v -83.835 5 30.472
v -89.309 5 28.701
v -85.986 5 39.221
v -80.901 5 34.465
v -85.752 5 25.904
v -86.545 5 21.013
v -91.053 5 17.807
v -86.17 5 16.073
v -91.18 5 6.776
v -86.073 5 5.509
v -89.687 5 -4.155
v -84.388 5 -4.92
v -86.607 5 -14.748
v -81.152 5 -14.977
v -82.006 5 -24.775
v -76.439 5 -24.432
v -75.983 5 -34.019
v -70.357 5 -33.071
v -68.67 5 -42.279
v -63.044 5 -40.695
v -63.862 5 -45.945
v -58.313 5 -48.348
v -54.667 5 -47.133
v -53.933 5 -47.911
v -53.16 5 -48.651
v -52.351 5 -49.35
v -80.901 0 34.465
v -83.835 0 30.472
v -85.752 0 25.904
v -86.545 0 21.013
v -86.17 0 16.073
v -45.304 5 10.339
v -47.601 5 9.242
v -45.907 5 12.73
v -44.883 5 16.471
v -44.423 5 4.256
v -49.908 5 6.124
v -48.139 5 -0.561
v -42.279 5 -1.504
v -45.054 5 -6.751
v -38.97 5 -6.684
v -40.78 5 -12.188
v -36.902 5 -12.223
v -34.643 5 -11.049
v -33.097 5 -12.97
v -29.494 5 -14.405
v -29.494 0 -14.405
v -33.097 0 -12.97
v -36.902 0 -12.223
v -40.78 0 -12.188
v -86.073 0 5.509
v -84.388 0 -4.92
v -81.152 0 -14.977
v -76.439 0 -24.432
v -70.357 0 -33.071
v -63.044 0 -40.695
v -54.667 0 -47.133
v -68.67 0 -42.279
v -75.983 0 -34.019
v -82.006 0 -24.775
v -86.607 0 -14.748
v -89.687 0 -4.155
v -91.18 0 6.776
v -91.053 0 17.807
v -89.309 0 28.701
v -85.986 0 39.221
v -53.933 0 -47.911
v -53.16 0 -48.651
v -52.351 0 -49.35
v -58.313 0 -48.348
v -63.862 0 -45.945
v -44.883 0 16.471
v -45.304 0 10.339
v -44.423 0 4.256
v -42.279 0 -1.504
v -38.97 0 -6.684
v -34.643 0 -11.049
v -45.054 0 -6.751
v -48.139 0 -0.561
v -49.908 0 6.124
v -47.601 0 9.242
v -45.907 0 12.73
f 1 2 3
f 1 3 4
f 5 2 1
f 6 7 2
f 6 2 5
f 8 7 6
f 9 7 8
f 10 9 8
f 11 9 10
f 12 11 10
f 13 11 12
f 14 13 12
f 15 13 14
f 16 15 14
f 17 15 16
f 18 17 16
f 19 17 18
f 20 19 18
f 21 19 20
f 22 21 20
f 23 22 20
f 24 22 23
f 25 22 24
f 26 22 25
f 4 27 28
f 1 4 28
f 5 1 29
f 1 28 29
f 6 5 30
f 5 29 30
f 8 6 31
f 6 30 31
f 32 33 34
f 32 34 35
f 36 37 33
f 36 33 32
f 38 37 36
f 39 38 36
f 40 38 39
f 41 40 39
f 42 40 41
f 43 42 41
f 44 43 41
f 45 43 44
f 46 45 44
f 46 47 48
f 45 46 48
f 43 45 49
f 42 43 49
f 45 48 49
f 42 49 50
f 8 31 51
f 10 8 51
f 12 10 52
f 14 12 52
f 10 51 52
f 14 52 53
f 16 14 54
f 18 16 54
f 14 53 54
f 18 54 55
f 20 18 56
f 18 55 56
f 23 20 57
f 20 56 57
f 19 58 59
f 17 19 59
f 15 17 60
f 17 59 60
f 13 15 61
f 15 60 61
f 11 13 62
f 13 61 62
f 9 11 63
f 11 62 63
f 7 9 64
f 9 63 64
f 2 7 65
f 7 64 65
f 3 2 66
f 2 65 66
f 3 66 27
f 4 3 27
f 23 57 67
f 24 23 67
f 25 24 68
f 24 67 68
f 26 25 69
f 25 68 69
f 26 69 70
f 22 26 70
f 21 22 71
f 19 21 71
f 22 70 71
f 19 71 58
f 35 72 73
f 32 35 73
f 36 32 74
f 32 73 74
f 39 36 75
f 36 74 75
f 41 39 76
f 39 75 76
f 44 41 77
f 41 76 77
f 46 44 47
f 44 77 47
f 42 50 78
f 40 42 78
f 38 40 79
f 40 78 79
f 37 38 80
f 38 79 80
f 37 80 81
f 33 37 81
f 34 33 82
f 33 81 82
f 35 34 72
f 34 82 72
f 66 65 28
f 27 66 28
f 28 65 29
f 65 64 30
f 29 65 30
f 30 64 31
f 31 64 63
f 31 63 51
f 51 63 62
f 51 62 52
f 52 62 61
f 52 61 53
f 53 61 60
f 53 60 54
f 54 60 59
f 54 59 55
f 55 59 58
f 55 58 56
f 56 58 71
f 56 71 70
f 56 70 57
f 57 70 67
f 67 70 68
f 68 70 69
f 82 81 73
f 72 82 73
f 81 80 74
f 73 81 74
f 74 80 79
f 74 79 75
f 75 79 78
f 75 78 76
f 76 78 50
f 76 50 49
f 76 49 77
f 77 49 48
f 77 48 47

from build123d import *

# Parameters (mm, degrees)
BOSS_EXTRU_1_DEPTH   = 5
BOSS_EXTRU_1_2_DEPTH = 5


with BuildPart() as part:
    # Esquisse1 → Boss.-Extru.1 (new body)
    with BuildSketch(Plane(origin=(0, 0, 0), x_dir=(1, 0, 0), z_dir=(0, 1, 0))):
        with BuildLine():
            ThreePointArc((-68.670306383, 42.279177512), (-89.686909751, 4.154853404), (-85.986425434, -39.22103992))
            Line((-85.986425434, -39.22103992), (-80.900990435, -34.464540644))
            ThreePointArc((-80.900990435, -34.464540644), (-85.751719928, -25.903787737), (-86.17049139, -16.073187685))
            ThreePointArc((-86.17049139, -16.073187685), (-78.973775537, 19.793847734), (-54.666943907, 47.13273734))
            ThreePointArc((-54.666943907, 47.13273734), (-53.551106318, 48.285581279), (-52.350511604, 49.349872124))
            ThreePointArc((-52.350511604, 49.349872124), (-61.160452612, 47.314883556), (-68.670306383, 42.279177512))
        make_face()
    extrude(amount=BOSS_EXTRU_1_DEPTH)


with BuildPart() as body_2:
    # Esquisse1 → Boss.-Extru.1 2 (new body)
    with BuildSketch(Plane(origin=(0, 0, 0), x_dir=(1, 0, 0), z_dir=(0, 1, 0))):
        with BuildLine():
            ThreePointArc((-40.780479115, 12.187773174), (-46.754151205, 3.734713014), (-49.907579974, -6.124032915))
            ThreePointArc((-49.907579974, -6.124032915), (-46.673295144, -10.946787783), (-44.883425416, -16.470910269))
            ThreePointArc((-44.883425416, -16.470910269), (-42.279203381, 1.504277637), (-29.4940321, 14.405004281))
            ThreePointArc((-29.4940321, 14.405004281), (-34.982493838, 12.508599622), (-40.780479115, 12.187773174))
        make_face()
    extrude(amount=BOSS_EXTRU_1_2_DEPTH)


solid = Compound([part.part, body_2.part])
